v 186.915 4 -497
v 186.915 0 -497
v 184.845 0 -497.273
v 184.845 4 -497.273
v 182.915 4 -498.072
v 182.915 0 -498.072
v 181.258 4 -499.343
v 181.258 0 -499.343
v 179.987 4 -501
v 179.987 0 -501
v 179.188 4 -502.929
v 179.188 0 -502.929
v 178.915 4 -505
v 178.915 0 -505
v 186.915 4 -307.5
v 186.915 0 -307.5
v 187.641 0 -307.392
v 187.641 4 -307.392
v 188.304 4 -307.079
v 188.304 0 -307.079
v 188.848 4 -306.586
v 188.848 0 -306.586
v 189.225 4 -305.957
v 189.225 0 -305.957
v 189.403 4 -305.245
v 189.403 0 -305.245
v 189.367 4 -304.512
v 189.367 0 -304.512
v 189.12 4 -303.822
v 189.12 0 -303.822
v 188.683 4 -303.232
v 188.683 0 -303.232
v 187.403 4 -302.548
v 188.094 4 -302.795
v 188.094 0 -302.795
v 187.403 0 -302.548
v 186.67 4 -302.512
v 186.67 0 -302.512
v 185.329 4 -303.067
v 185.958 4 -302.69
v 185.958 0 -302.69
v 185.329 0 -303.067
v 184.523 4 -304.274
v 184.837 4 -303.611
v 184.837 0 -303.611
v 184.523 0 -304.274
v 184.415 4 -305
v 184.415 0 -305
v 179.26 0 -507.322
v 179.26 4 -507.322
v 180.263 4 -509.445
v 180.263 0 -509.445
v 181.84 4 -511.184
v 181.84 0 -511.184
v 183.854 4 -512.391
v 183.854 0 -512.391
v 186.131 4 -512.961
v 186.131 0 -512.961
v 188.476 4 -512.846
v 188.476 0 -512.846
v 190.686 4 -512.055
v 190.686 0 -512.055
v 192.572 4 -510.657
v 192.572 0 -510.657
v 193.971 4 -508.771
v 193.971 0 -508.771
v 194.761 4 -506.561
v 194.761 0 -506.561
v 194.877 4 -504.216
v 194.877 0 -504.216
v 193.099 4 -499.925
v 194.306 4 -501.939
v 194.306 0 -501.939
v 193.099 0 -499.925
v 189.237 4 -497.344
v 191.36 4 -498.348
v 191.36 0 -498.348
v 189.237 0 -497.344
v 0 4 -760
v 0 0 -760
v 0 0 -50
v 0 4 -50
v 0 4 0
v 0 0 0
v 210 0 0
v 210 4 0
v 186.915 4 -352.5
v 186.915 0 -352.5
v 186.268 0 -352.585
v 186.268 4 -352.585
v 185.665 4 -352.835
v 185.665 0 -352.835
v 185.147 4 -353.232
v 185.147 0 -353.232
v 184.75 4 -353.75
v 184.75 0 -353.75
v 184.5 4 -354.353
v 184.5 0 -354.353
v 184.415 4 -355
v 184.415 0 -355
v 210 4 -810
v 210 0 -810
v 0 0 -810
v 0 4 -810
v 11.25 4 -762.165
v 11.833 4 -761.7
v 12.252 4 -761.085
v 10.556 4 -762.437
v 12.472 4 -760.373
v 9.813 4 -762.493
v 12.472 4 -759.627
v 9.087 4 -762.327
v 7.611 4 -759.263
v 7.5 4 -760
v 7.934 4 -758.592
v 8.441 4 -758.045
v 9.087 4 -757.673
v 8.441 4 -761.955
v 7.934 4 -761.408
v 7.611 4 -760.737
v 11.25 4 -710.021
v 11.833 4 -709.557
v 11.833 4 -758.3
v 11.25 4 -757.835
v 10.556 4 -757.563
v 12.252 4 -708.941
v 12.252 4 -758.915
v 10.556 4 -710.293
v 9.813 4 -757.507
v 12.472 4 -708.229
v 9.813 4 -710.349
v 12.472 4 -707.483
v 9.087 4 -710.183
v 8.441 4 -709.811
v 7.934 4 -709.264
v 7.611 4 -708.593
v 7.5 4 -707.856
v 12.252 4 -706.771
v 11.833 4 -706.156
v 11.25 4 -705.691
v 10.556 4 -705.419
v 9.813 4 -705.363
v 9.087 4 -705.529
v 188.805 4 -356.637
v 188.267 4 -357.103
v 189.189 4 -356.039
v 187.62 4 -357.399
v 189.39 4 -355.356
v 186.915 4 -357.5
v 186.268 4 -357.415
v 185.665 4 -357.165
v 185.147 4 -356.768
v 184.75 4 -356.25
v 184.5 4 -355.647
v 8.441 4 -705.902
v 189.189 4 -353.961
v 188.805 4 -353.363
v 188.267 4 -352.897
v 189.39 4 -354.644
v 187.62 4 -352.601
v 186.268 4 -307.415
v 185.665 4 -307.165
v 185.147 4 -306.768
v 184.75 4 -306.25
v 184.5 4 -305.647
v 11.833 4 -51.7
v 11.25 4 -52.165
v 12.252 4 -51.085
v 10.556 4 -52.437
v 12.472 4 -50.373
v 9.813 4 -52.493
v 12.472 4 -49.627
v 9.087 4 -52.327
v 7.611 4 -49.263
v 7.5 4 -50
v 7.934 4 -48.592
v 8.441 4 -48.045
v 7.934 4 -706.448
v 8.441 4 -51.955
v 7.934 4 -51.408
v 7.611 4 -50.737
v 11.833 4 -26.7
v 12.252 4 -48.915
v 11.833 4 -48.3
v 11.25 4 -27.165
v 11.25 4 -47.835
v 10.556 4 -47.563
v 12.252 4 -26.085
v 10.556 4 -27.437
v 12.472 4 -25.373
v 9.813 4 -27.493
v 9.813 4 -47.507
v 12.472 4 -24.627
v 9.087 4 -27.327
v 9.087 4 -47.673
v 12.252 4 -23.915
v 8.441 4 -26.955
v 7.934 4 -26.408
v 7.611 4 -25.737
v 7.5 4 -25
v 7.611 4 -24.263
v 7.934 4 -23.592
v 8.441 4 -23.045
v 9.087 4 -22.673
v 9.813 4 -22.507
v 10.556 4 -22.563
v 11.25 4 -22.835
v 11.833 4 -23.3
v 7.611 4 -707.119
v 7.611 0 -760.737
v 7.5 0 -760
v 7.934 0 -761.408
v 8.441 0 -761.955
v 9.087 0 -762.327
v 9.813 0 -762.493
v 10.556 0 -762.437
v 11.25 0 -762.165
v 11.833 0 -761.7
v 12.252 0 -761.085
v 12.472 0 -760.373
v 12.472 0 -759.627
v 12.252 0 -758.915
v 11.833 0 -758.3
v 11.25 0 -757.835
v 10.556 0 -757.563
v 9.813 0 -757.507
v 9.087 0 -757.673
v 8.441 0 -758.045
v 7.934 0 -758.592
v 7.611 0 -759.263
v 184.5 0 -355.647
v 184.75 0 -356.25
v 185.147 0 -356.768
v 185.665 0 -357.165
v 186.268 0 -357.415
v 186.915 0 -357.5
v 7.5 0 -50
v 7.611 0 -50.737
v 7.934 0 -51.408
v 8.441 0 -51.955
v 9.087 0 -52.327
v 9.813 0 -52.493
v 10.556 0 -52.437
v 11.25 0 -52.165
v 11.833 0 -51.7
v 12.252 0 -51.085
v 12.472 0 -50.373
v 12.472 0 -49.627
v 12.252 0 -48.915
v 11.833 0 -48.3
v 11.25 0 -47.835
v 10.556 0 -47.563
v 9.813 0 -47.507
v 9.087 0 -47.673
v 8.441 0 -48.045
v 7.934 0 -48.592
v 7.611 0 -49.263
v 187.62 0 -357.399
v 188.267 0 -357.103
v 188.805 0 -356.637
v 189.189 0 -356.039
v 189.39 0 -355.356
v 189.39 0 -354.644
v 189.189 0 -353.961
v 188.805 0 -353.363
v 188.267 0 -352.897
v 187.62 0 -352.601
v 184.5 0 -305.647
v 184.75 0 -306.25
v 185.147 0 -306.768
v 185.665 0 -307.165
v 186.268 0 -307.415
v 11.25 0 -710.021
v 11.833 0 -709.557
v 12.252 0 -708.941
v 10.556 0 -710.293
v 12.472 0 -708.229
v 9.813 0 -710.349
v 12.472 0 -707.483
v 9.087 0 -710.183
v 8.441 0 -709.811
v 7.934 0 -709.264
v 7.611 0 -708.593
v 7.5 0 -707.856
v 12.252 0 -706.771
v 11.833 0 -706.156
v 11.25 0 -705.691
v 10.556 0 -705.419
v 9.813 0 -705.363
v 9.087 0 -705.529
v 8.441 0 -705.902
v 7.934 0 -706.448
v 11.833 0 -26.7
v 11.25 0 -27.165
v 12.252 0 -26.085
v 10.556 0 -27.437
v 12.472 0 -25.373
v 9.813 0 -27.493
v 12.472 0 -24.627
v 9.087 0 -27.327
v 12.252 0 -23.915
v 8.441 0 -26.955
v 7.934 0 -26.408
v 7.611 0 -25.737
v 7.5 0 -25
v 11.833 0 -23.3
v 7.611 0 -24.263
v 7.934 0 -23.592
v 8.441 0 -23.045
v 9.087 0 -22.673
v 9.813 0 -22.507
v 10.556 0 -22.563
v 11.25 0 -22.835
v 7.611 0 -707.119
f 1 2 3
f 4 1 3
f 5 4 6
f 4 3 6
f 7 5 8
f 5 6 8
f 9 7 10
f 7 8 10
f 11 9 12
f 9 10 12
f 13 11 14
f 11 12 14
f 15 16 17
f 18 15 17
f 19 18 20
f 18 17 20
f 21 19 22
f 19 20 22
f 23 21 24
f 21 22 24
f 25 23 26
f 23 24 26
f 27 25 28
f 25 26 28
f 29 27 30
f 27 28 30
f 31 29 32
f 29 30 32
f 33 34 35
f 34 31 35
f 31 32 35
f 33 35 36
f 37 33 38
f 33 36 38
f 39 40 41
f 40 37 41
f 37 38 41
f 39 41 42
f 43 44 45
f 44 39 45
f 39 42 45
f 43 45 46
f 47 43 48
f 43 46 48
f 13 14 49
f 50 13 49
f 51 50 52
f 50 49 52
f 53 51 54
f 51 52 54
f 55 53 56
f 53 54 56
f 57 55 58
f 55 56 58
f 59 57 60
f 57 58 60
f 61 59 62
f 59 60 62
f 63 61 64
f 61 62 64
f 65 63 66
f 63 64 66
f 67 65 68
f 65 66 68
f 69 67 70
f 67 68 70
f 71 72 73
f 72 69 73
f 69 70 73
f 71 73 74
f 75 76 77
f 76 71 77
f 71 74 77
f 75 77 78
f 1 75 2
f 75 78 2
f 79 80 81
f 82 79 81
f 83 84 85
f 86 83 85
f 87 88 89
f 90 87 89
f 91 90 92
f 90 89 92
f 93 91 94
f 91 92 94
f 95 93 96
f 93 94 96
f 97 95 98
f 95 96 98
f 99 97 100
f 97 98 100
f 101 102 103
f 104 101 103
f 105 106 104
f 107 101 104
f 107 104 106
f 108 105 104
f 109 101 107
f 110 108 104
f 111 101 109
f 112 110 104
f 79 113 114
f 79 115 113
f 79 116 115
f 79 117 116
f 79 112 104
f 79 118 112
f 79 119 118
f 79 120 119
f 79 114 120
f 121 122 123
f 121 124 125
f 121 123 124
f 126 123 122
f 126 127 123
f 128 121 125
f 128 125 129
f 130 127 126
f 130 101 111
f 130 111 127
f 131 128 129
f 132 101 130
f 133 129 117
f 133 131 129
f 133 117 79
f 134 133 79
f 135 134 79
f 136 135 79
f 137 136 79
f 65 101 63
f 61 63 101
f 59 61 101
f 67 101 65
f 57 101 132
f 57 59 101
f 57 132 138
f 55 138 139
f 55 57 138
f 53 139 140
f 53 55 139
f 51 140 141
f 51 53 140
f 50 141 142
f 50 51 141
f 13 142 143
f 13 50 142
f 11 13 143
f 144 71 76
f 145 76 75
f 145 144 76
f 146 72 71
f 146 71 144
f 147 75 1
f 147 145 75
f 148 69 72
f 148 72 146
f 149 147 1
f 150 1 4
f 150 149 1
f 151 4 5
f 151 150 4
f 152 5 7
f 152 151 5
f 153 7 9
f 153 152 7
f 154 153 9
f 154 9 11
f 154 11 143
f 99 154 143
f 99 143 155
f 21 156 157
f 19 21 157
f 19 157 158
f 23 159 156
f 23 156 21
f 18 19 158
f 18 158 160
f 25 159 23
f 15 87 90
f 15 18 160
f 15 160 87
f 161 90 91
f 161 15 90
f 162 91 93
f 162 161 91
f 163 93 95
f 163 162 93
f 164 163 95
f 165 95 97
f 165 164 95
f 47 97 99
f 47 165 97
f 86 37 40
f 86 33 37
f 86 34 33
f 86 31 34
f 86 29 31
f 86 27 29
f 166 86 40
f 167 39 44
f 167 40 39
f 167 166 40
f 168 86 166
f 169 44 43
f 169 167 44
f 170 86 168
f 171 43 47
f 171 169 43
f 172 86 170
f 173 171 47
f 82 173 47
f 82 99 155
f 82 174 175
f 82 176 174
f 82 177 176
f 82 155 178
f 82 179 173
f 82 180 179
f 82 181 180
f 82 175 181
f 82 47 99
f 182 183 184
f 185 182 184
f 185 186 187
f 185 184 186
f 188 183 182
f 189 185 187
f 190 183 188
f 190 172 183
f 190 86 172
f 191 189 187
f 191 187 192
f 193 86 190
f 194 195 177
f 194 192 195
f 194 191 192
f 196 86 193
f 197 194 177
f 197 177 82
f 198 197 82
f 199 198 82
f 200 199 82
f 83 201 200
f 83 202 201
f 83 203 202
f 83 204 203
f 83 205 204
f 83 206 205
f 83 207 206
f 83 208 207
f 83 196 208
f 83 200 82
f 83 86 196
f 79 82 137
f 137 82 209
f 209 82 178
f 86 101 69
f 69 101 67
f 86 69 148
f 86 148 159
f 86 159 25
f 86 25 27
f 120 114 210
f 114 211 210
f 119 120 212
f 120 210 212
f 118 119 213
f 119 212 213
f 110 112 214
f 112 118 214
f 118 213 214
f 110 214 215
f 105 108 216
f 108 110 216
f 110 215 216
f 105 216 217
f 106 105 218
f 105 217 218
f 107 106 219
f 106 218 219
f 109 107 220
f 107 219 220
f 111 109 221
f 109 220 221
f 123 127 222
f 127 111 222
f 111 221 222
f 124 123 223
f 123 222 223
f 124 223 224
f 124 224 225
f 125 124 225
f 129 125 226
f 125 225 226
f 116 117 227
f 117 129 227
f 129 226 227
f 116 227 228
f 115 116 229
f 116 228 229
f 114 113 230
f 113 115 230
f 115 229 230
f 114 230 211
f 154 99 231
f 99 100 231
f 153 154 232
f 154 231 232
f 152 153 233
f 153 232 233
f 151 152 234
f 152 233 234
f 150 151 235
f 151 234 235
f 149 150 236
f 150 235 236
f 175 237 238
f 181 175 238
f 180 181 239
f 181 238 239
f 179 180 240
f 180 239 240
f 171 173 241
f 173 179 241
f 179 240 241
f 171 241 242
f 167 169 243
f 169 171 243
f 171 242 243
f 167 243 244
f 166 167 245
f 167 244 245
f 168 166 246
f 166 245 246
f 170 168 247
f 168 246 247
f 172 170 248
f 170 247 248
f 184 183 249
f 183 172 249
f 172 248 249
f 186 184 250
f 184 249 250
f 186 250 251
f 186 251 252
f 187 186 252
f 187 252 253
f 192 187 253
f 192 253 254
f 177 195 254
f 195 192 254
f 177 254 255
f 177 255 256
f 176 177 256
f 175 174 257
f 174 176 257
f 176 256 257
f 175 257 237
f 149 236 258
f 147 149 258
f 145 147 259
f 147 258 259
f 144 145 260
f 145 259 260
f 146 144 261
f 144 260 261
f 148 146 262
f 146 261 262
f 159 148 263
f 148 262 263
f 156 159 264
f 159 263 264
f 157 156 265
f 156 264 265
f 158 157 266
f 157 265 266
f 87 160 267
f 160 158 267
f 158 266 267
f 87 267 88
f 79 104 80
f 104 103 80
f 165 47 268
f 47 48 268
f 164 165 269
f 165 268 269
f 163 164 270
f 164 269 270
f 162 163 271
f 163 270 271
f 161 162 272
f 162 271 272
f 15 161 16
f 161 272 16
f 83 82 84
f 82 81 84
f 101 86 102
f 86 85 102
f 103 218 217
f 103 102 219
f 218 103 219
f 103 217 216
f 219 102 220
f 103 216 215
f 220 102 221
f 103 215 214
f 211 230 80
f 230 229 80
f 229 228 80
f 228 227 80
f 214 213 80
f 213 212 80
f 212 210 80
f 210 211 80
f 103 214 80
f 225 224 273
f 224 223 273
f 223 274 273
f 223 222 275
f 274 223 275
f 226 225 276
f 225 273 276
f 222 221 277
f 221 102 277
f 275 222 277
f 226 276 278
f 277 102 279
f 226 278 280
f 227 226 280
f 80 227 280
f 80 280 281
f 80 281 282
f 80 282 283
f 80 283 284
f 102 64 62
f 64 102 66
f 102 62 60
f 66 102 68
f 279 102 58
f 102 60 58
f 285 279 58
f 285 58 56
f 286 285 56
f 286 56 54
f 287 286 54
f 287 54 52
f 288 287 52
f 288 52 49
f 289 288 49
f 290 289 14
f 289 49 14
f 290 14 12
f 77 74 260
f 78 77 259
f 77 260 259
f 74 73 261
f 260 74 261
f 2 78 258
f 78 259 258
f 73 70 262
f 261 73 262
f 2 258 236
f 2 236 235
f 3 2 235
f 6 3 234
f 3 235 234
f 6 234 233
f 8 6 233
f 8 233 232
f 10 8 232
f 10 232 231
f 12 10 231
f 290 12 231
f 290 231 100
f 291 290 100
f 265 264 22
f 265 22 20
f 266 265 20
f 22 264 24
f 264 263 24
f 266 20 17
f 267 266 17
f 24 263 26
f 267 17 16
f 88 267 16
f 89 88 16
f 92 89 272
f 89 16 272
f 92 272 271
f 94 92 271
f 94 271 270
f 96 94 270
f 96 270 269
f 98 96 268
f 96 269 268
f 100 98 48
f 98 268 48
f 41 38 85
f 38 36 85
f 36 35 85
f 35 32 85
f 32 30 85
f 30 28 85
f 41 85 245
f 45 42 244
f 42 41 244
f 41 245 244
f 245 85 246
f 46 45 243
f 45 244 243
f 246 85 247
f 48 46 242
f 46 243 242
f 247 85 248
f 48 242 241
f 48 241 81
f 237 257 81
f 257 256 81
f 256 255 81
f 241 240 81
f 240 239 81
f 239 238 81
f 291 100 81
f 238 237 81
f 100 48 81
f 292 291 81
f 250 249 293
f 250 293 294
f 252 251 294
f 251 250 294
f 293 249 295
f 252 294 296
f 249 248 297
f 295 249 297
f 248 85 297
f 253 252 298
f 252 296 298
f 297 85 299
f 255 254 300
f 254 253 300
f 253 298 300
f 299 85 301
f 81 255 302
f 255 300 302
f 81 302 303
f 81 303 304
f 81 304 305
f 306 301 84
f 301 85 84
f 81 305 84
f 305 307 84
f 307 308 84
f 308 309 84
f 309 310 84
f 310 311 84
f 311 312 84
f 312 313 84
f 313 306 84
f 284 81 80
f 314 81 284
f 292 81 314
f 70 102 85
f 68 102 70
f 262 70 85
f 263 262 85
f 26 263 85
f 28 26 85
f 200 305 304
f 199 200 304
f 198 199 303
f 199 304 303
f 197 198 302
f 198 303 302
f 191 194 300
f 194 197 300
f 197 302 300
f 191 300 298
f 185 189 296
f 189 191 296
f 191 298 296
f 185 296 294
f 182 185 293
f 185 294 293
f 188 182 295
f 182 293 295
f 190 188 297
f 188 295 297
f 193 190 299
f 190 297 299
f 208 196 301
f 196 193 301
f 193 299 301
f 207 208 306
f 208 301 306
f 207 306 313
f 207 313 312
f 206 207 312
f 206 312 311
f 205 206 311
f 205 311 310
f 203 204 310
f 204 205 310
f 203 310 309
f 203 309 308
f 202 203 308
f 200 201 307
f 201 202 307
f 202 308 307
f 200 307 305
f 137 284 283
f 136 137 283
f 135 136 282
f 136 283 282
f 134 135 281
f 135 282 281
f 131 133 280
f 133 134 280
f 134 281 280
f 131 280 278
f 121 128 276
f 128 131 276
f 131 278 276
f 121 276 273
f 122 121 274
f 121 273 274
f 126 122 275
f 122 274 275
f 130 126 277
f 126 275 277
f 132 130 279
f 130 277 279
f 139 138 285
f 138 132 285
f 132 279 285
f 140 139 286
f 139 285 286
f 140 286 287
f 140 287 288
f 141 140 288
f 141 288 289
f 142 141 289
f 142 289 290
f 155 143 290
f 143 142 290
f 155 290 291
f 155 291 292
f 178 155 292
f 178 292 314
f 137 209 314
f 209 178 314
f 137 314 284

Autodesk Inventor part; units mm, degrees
ref_plane "YZ Plane" through (0, 0, 0) normal (1, 0, 0) x (0, 1, 0)
ref_plane "XZ Plane" through (0, 0, 0) normal (0, 1, 0) x (-1, 0, 0)
ref_plane "XY Plane" through (0, 0, 0) normal (0, 0, 1) x (1, 0, 0)
sketch "Эскиз1" plane through (0, 0, 0) normal (0, 1, 0) x (-1, 0, 0)
  line L0 (0, 0) -> (-210, 0)
  line L1 (-210, 0) -> (-210, -810)
  line L2 (-210, -810) -> (0, -810)
  line L3 (0, -810) -> (0, 0)
  line L4 (-186.9152, -405) -> (-186.9152, -395)
  line L5 (-186.9152, -395) -> (-186.9152, -305)
  line L6 (-186.9152, -305) -> (-186.9152, -505)
  circle A0 centre (-186.9152, -505) radius 8
  circle A1 centre (-186.9152, -305) radius 2.5
  line L7 (-186.9152, -305) -> (-186.9152, -310)
  line L8 (-186.9152, -310) -> (-186.9152, -355)
  circle A2 centre (-186.9152, -355) radius 2.5
  line L9 (0, 0) -> (0, -50)
  line L10 (0, -50) -> (-10, -50)
  line L11 (0, -810) -> (0, -760)
  line L12 (0, -760) -> (-10, -760)
  circle A3 centre (-10, -760) radius 2.5
  circle A4 centre (-10, -707.8561) radius 2.5
  circle A5 centre (-10, -50) radius 2.5
  circle A6 centre (-10, -25) radius 2.5
  dimension "d0" = 210
  dimension "d1" = 810
  dimension "d2" = 10
  dimension "d3" = 90
  dimension "d4" = 200
  dimension "d5" = 16
  dimension "d6" = 5
  dimension "d7" = 5
  dimension "d8" = 45
  dimension "d9" = 5
  dimension "d10" = 50
  dimension "d11" = 10
  dimension "d12" = 50
  dimension "d13" = 10
  dimension "d14" = 5
  dimension "d15" = 5
  dimension "d16" = 5
  dimension "d17" = 5
extrude "Выдавливание1" add sketch "Эскиз1" along normal blind 4
properties part number "Дверь"
